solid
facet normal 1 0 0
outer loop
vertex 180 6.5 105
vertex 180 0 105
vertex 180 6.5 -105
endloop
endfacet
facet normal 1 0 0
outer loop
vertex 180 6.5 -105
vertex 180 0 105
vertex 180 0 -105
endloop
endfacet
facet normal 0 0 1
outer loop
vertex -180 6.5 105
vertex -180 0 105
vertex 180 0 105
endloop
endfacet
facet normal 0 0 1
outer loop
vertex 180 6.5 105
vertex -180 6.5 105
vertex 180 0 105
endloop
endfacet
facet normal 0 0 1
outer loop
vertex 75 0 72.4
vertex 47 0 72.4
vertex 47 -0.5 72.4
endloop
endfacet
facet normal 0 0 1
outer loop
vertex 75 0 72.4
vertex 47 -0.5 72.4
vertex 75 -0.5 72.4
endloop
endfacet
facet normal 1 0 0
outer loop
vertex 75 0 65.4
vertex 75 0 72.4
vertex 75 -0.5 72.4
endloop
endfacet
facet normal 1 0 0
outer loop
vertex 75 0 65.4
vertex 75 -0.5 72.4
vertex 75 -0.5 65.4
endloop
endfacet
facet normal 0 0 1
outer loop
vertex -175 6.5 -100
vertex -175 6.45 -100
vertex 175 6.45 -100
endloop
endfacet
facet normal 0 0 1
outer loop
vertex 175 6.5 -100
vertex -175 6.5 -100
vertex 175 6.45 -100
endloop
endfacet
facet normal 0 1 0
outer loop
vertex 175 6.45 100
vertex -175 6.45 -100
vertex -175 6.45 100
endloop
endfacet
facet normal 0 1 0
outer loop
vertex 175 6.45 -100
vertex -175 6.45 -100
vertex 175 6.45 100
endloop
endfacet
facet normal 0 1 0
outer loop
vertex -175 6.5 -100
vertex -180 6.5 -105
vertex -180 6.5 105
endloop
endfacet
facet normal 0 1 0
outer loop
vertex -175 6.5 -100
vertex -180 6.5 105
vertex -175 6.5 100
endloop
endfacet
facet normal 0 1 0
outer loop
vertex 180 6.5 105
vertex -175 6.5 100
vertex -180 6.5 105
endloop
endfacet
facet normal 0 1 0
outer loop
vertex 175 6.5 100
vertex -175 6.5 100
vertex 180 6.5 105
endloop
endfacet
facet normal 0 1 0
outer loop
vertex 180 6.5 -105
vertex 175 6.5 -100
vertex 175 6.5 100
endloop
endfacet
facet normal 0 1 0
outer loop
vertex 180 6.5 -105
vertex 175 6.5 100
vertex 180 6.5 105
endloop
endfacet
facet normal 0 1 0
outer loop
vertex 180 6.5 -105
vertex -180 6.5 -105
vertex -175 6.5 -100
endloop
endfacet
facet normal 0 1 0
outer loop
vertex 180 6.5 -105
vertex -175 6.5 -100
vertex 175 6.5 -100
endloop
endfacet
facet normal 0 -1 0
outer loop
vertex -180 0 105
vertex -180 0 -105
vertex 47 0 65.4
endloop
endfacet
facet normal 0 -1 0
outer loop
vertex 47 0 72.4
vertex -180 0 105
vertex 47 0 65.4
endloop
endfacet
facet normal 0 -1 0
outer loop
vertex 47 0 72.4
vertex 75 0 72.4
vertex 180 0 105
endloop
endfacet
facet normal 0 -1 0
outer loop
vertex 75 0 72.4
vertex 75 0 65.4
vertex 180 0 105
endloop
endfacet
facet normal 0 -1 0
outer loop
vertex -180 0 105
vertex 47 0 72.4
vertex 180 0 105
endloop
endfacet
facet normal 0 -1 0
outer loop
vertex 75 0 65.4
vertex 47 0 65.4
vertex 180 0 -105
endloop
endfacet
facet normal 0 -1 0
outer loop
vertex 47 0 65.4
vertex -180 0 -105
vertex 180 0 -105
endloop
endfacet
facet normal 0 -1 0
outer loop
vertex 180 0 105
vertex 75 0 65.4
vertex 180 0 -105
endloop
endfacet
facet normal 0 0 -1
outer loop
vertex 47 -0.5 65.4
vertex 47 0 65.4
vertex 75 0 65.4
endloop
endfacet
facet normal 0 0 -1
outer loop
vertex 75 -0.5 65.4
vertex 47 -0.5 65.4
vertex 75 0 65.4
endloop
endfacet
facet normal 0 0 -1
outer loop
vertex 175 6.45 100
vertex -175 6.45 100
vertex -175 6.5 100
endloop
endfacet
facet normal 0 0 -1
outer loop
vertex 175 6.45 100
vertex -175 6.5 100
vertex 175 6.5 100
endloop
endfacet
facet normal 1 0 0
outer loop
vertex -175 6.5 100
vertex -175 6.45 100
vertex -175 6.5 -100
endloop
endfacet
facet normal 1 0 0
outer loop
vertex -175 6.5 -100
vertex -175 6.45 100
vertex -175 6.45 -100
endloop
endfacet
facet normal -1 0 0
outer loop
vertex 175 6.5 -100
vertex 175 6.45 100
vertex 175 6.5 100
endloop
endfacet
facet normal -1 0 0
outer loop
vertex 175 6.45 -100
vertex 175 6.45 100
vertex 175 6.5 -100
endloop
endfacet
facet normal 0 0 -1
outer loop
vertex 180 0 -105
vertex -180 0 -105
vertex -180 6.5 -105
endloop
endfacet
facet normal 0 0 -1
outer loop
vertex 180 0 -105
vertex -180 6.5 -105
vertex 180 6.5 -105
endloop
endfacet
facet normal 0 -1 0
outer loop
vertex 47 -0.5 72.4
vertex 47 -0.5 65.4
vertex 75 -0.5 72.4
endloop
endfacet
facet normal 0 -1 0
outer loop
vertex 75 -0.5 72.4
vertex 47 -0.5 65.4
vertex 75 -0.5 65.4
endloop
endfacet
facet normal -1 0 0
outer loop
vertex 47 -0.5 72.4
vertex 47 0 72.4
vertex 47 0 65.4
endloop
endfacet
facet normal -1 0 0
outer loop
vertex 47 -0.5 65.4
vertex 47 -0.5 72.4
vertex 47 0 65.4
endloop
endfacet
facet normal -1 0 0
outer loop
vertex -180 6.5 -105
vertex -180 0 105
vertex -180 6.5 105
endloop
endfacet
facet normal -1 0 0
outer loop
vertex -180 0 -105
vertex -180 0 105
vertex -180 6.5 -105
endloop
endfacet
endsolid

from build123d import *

# Parameters (mm, degrees)
SKETCH1_W           = 350
SKETCH1_H           = 200
BOSS_EXTRUDE3_DEPTH = 6.45
SKETCH1_4_W         = 360
SKETCH1_4_H         = 210
SKETCH1_4_W_2       = 350
SKETCH1_4_H_2       = 200
BOSS_EXTRUDE4_DEPTH = 6.5
SKETCH1_5_W         = 28
SKETCH1_5_H         = 7
BOSS_EXTRUDE5_DEPTH = 0.5


with BuildPart() as part:
    # Sketch1 → Boss-Extrude3 (new body)
    with BuildSketch(Plane(origin=(0, 0, 0), x_dir=(1, 0, 0), z_dir=(0, 1, 0))):
        Rectangle(SKETCH1_W, SKETCH1_H)
    extrude(amount=BOSS_EXTRUDE3_DEPTH)

    # Sketch1<4> → Boss-Extrude4 (add)
    with BuildSketch(Plane(origin=(0, 0, 0), x_dir=(1, 0, 0), z_dir=(0, 1, 0))):
        Rectangle(SKETCH1_4_W, SKETCH1_4_H)
        Rectangle(SKETCH1_4_W_2, SKETCH1_4_H_2, mode=Mode.SUBTRACT)
    extrude(amount=BOSS_EXTRUDE4_DEPTH)

    # Sketch1<5> → Boss-Extrude5 (add)
    with BuildSketch(Plane(origin=(0, 0, 0), x_dir=(1, 0, 0), z_dir=(0, 1, 0))):
        with Locations((61, -68.9)):
            Rectangle(SKETCH1_5_W, SKETCH1_5_H)
    extrude(amount=-BOSS_EXTRUDE5_DEPTH)


solid = part.part
